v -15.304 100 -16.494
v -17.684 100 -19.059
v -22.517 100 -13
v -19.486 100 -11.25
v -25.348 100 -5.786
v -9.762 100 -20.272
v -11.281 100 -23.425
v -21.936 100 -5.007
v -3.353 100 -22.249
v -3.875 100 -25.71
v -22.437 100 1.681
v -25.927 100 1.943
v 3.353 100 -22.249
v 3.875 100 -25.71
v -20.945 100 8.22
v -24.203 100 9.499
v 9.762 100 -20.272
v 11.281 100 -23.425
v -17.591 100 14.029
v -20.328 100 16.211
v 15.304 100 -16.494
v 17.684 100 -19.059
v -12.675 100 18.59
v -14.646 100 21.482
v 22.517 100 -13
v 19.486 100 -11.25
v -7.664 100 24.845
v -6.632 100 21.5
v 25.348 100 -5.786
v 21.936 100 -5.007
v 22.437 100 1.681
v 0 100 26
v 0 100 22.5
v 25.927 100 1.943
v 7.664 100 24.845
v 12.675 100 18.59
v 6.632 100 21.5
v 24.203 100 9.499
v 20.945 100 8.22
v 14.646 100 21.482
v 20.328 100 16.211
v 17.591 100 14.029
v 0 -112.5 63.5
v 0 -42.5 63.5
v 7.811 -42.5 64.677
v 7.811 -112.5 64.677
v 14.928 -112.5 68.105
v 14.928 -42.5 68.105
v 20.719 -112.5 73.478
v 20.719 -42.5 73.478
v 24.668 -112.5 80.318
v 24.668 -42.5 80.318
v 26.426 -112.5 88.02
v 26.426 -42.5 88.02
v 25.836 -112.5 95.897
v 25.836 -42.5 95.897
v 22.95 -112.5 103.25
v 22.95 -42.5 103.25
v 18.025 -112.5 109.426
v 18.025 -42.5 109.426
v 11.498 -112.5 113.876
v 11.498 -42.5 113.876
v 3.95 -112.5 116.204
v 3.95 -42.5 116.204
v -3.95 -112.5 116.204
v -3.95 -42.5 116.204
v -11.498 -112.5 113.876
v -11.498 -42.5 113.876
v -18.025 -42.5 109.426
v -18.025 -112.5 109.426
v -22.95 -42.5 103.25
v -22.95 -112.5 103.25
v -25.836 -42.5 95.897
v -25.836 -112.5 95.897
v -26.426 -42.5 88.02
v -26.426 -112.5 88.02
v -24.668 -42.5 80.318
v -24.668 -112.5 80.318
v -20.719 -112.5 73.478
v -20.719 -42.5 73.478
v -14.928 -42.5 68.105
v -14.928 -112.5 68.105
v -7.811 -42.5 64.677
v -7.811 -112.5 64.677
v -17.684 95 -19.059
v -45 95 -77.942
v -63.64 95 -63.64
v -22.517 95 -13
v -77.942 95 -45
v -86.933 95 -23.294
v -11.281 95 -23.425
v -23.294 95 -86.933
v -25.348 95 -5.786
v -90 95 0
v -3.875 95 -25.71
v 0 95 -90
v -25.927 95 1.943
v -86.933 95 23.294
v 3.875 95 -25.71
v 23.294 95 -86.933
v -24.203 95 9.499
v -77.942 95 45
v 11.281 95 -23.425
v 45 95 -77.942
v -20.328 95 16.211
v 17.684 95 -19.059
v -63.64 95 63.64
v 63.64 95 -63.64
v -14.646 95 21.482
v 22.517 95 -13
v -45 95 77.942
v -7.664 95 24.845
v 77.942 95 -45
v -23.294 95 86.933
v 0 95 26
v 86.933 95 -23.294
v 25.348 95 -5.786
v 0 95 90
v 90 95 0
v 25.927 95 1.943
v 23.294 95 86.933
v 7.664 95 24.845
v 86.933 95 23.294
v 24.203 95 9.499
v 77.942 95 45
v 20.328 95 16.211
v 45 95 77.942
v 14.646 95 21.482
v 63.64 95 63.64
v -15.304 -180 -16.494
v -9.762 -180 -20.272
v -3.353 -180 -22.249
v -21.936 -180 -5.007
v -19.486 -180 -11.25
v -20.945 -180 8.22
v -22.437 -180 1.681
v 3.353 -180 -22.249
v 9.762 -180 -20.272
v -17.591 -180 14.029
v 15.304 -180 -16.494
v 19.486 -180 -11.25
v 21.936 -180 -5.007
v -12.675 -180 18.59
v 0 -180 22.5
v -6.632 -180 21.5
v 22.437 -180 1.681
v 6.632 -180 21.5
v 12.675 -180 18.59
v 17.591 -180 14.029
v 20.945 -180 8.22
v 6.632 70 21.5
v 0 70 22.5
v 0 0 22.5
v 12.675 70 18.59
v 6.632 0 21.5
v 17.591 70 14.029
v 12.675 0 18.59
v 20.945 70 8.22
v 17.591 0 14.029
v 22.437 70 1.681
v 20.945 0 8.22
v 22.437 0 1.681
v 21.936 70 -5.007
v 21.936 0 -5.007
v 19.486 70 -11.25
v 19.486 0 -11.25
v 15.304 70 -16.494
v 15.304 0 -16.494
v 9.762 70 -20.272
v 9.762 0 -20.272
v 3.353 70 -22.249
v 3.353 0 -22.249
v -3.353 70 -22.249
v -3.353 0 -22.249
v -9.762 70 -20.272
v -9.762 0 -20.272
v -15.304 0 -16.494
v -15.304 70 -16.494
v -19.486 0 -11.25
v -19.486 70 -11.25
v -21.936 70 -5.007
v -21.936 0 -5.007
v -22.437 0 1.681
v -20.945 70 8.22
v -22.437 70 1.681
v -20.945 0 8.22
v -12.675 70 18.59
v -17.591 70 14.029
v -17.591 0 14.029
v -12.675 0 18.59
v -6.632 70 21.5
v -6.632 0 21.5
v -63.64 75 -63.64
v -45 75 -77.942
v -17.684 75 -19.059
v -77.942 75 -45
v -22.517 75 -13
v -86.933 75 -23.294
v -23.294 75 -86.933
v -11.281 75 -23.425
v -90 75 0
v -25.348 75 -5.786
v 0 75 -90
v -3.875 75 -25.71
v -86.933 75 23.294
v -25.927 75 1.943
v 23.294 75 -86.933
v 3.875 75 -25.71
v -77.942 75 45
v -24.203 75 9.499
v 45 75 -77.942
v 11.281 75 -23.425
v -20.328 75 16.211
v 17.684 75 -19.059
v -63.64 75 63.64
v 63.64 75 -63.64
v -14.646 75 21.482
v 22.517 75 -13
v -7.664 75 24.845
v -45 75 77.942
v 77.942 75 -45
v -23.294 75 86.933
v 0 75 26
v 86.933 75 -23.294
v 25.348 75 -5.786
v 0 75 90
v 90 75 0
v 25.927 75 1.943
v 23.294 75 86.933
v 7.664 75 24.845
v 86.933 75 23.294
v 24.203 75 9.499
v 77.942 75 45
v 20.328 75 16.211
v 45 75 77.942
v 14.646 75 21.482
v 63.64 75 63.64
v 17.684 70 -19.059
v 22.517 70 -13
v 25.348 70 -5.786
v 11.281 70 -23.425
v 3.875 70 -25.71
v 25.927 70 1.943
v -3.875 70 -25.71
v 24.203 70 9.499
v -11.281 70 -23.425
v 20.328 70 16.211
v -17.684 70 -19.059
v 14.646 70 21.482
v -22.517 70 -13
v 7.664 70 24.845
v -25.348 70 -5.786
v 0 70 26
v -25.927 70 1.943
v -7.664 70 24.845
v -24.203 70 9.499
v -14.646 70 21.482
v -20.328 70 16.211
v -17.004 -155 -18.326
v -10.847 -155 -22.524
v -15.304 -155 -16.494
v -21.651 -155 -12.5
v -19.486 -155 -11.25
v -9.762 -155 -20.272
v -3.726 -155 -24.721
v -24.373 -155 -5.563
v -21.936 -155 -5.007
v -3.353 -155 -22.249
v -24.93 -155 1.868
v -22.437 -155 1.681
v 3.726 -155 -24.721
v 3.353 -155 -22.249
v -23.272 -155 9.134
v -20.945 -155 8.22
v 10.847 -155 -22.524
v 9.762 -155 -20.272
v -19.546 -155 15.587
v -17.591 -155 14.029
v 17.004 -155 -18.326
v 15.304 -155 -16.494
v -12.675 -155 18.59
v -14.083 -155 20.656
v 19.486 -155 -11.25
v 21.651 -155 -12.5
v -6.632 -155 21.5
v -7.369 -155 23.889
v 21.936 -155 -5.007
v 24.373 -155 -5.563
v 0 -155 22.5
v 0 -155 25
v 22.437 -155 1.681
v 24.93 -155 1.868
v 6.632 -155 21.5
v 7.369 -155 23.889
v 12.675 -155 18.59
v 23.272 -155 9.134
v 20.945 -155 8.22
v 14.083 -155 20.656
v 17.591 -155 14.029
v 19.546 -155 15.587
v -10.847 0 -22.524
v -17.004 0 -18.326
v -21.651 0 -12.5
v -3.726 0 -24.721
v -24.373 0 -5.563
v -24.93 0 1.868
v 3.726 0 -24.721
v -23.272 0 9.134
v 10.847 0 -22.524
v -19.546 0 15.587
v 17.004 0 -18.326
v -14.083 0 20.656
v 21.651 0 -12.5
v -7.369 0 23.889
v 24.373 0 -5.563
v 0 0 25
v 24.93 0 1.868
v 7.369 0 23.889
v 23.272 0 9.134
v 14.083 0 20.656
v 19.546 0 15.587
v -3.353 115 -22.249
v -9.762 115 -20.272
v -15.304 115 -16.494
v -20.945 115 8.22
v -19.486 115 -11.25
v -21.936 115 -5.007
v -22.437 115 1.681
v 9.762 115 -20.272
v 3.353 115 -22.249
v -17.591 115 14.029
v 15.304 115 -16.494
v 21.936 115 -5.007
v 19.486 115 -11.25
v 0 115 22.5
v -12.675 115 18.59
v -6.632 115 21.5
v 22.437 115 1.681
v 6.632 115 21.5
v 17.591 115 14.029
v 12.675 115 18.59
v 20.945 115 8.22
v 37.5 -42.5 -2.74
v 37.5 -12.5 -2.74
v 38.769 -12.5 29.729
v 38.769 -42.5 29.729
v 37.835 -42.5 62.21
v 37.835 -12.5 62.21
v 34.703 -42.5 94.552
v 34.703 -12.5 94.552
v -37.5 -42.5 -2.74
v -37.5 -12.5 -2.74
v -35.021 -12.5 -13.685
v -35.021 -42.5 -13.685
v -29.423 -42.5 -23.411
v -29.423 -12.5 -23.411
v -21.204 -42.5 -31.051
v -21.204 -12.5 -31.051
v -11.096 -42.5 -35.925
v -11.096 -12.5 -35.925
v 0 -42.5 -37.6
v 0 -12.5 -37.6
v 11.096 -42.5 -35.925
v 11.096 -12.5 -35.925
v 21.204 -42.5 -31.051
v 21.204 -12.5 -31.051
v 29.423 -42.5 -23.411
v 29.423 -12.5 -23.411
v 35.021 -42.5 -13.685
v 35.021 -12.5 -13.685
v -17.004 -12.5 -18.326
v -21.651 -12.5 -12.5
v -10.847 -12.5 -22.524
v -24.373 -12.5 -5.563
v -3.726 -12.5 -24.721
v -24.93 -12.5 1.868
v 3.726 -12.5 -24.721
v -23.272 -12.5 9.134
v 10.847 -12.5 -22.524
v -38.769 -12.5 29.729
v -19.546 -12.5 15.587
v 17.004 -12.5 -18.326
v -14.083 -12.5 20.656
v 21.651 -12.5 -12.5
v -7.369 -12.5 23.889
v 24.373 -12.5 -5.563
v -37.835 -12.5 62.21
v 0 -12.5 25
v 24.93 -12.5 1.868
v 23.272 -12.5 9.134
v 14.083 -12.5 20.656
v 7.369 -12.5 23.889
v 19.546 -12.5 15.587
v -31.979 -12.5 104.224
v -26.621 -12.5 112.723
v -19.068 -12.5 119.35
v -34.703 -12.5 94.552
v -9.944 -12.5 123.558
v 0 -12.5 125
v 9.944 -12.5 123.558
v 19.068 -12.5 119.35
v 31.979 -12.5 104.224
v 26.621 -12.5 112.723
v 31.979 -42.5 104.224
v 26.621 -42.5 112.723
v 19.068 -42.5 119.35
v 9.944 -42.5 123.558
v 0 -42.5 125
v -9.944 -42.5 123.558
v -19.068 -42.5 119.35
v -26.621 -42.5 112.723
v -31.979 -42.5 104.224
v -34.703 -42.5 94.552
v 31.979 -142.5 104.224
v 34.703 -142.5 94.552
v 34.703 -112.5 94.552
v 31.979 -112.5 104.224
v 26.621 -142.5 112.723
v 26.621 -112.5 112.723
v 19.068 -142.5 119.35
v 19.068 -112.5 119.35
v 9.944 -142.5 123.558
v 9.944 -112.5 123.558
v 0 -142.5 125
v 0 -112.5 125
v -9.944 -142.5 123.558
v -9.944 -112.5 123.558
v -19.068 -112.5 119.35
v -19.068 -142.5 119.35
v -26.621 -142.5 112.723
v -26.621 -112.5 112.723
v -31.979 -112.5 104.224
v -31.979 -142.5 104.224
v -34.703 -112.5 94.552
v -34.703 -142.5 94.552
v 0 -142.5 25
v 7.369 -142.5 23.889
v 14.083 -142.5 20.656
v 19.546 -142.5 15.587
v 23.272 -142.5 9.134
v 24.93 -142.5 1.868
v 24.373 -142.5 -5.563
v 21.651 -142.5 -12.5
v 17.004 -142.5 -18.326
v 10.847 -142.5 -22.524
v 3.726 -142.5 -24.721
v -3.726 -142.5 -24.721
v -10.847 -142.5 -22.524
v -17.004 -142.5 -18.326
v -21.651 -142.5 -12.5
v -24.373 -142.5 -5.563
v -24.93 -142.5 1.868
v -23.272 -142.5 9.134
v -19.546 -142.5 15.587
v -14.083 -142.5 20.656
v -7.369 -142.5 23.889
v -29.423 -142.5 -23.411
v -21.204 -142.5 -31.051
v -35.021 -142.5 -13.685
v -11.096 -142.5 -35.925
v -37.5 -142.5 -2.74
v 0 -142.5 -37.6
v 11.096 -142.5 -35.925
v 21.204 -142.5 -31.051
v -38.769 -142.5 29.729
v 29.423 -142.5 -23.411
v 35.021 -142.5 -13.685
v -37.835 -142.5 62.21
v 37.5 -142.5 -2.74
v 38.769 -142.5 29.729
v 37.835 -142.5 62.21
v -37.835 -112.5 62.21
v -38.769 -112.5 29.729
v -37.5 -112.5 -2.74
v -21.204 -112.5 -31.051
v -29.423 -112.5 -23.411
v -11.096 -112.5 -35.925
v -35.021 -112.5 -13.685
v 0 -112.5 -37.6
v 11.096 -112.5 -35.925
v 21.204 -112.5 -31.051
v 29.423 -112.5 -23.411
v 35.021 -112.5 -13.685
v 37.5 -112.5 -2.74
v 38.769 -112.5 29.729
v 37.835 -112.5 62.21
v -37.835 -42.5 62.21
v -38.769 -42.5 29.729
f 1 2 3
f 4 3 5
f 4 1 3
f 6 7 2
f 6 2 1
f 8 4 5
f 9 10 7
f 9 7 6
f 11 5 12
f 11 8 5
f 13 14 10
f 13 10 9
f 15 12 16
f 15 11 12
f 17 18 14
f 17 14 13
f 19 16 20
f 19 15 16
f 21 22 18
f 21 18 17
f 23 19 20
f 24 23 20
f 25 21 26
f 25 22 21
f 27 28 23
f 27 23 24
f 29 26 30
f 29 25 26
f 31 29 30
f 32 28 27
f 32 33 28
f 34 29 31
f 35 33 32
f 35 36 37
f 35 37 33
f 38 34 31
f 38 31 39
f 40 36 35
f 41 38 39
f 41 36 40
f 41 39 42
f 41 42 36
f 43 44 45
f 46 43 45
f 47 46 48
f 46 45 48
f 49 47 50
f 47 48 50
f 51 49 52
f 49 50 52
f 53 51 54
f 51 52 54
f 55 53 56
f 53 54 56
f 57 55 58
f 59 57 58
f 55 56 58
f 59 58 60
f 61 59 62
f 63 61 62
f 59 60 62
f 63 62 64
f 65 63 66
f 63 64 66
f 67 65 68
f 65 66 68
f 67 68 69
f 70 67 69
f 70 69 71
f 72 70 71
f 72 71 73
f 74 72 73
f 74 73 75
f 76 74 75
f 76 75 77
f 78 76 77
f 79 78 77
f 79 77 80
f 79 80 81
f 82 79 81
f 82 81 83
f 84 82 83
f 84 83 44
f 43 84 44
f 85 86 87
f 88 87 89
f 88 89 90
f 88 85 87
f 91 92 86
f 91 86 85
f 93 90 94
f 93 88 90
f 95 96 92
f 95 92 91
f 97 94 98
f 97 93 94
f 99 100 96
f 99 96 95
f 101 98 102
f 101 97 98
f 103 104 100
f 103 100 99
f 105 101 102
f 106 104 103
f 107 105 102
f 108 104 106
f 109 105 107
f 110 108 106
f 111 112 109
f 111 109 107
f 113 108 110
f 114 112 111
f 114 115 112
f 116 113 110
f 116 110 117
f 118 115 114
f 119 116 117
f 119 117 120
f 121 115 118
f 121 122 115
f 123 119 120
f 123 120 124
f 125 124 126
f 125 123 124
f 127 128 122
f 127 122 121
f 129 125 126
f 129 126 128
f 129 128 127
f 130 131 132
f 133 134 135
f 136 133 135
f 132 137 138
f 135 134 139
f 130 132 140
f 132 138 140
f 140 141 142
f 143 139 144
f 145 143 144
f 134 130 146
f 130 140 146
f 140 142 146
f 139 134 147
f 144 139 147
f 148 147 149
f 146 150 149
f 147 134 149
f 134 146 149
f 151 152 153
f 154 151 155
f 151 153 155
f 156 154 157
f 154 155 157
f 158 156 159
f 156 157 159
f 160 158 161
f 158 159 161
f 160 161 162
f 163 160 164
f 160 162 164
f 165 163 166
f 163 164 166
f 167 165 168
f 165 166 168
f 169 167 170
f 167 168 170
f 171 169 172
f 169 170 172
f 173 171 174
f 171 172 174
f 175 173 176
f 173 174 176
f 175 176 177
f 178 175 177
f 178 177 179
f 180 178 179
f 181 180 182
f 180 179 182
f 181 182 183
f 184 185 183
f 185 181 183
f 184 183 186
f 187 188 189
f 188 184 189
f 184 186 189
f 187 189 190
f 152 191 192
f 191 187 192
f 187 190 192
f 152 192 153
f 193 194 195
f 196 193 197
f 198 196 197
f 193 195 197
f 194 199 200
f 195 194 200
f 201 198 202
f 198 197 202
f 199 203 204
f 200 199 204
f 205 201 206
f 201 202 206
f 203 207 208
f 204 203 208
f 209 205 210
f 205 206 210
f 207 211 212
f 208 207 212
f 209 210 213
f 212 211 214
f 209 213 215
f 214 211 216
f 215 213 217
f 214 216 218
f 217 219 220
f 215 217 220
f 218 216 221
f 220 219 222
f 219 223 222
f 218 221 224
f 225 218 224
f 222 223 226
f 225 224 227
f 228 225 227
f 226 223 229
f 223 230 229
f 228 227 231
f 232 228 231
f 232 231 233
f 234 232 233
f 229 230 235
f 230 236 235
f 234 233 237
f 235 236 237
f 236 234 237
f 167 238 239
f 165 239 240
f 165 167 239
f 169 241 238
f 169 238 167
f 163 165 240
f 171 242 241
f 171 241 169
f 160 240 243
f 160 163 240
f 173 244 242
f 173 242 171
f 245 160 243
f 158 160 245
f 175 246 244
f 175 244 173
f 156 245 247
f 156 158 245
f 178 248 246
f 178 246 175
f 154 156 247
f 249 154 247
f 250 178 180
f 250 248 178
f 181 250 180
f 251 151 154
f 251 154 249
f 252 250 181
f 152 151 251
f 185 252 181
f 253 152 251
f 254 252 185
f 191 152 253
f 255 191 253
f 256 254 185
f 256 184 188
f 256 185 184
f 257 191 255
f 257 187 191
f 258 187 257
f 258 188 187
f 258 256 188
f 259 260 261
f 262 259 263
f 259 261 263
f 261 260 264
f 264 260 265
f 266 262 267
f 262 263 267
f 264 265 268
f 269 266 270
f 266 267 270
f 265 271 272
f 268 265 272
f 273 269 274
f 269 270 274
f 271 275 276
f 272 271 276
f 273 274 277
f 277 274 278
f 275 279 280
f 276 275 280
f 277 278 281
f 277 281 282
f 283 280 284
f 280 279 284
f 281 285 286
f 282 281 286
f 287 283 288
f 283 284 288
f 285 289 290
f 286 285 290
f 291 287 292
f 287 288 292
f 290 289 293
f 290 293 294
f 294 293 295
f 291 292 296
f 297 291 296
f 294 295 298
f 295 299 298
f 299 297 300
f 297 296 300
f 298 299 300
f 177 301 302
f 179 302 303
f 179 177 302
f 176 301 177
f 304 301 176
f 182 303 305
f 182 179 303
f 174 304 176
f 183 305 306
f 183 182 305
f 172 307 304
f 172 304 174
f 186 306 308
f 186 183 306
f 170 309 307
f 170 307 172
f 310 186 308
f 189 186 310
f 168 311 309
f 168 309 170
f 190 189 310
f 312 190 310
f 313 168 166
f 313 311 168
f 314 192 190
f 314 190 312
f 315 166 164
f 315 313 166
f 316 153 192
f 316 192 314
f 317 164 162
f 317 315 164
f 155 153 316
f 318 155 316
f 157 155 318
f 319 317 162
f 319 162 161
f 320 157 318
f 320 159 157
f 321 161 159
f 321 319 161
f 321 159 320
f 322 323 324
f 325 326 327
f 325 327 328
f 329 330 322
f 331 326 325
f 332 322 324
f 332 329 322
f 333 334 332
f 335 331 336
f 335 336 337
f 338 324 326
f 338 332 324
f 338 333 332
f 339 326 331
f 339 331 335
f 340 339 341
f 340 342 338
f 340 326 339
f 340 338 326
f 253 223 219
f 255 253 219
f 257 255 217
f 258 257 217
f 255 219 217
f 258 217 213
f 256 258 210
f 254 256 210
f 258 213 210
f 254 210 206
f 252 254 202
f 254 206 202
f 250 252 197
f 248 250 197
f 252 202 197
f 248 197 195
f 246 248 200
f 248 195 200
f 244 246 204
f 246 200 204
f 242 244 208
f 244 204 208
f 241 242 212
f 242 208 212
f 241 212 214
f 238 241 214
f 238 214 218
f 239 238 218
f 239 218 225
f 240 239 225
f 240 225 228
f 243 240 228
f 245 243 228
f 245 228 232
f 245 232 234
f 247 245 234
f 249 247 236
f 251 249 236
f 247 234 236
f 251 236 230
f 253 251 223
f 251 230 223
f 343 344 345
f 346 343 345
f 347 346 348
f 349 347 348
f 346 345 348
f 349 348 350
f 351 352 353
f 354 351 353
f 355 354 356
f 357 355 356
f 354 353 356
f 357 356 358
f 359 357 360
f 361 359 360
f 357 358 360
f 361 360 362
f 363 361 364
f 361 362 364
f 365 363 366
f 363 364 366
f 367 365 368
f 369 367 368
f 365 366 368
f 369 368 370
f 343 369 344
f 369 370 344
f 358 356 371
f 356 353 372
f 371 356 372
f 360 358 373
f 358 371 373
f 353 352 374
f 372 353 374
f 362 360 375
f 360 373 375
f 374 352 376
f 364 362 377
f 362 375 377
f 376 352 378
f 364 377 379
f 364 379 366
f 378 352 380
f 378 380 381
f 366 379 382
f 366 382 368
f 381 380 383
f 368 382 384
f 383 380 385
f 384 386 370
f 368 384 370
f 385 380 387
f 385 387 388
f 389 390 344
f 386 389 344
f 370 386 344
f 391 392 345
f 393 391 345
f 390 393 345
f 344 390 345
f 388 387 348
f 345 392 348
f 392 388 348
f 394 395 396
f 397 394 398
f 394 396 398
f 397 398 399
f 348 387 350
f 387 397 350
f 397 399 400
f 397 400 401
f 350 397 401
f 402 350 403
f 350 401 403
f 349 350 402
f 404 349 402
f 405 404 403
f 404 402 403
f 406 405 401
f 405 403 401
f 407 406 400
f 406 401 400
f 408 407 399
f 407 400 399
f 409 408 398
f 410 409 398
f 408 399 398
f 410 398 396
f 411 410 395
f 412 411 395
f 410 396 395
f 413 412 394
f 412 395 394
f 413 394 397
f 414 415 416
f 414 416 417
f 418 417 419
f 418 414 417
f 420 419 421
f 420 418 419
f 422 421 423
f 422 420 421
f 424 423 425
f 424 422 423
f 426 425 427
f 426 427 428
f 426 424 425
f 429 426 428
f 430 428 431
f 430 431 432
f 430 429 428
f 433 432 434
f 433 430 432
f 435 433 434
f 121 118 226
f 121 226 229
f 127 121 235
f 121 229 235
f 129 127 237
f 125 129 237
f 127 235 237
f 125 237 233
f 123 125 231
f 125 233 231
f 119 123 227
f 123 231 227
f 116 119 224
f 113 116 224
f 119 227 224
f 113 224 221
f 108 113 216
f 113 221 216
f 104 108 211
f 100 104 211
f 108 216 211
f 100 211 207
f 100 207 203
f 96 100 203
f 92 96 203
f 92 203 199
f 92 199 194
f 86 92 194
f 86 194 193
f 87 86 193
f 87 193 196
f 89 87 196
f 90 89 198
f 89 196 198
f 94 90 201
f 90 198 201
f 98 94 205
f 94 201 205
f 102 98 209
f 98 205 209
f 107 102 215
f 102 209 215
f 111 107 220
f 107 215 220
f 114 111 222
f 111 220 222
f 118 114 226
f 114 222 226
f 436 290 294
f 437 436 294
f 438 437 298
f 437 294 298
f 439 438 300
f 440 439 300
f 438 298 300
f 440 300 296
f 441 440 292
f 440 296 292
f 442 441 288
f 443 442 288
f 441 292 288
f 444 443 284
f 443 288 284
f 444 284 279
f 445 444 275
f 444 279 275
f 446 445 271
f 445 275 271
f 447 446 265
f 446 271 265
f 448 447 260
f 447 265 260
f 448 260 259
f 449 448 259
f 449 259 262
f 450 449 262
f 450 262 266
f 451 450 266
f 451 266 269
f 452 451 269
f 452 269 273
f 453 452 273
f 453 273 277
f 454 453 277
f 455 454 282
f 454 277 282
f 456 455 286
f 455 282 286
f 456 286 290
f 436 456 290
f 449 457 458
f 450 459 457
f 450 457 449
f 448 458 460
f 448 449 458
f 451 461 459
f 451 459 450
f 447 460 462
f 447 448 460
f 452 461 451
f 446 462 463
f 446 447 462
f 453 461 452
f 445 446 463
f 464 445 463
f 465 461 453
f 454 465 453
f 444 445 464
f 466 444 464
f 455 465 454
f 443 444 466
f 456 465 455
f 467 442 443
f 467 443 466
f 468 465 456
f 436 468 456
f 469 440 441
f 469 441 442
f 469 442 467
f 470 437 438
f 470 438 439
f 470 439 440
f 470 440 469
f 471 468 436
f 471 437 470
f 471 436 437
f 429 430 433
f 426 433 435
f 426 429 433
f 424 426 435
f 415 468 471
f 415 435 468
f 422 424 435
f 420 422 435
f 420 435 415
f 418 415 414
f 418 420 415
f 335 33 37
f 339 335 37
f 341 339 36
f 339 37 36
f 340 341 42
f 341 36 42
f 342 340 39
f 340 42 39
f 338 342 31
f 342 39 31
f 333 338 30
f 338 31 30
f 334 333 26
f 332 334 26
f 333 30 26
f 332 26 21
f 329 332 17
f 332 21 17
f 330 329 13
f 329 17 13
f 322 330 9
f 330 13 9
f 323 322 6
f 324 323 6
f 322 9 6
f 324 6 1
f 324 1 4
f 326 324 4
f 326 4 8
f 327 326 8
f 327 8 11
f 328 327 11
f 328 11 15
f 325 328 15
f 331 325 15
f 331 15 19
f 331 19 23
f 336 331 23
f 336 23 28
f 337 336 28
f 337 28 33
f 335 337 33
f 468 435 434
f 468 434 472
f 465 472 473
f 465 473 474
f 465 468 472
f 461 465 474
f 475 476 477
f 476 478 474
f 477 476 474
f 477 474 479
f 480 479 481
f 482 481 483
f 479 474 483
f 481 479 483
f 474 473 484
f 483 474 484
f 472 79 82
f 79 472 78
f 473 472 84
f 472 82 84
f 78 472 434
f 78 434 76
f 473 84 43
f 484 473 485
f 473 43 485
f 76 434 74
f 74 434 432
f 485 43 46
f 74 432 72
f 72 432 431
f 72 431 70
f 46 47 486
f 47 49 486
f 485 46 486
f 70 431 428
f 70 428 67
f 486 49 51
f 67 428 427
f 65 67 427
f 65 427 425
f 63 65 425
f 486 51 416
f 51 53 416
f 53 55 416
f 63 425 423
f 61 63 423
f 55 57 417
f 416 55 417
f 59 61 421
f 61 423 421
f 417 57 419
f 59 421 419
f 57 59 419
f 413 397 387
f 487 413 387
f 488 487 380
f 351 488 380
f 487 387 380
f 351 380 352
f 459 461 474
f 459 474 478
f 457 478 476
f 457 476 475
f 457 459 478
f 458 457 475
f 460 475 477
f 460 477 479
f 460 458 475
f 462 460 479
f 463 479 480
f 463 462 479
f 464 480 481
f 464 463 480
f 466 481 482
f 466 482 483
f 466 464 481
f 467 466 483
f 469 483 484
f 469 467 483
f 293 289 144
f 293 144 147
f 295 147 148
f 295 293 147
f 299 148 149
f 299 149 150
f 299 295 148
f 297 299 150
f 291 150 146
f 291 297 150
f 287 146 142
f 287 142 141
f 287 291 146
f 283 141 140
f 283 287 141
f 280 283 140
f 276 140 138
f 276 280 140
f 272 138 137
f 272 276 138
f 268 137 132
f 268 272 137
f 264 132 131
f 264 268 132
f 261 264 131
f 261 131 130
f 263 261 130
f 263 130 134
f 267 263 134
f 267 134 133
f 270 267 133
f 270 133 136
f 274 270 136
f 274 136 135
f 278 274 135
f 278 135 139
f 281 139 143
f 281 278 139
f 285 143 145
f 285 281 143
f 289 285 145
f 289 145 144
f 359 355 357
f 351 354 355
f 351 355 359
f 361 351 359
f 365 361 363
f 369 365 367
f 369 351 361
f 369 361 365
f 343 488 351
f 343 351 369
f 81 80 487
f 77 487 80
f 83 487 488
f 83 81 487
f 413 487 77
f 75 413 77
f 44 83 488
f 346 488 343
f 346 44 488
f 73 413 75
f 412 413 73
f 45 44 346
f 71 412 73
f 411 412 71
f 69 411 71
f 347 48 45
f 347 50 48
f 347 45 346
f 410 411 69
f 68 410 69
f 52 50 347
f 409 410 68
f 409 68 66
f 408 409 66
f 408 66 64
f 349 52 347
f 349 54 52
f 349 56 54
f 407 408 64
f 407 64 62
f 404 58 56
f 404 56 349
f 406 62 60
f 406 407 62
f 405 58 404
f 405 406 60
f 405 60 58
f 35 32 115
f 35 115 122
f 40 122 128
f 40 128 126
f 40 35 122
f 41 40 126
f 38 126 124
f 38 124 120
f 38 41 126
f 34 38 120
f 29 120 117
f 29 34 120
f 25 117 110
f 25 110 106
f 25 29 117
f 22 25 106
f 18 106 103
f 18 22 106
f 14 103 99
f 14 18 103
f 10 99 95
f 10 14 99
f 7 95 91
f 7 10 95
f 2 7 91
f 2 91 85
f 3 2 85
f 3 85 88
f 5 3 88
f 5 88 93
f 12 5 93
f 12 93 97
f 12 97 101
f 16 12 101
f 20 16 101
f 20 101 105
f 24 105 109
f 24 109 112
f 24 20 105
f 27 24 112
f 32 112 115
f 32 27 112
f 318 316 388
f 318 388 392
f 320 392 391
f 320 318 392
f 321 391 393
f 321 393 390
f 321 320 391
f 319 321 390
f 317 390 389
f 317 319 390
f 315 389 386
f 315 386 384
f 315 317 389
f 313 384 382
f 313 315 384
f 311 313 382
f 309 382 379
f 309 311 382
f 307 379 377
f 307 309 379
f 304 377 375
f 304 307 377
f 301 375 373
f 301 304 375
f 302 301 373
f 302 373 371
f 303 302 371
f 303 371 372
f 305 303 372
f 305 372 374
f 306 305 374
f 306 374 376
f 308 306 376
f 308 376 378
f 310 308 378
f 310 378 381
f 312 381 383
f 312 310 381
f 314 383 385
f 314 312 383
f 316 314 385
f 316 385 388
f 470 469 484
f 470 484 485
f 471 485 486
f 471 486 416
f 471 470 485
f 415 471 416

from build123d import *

# Parameters (mm, degrees)
SKETCH1_R           = 22.5
BOSS_EXTRUDE1_DEPTH = 25
SKETCH2_R           = 25
BOSS_EXTRUDE2_DEPTH = 12.5
BOSS_EXTRUDE3_DEPTH = 30
SKETCH4_R           = 26.5
BOSS_EXTRUDE4_DEPTH = 35
SKETCH5_R           = 22.5
BOSS_EXTRUDE5_DEPTH = 50
SKETCH6_R           = 90
BOSS_EXTRUDE6_DEPTH = 20
SKETCH7_R           = 22.5
BOSS_EXTRUDE7_DEPTH = 20
SKETCH8_R           = 26
BOSS_EXTRUDE8_DEPTH = 5
BOSS_EXTRUDE9_START = 5
SKETCH9_R           = 26
BOSS_EXTRUDE9_DEPTH = 5


with BuildPart() as part:
    # Sketch1 → Boss-Extrude1 (new body)
    with BuildSketch(Plane(origin=(0, 0, 0), x_dir=(1, 0, 0), z_dir=(0, 1, 0))):
        with Locations(Location((0, 0, 0), (0, 0, 270))):
            Circle(SKETCH1_R)
    extrude(amount=BOSS_EXTRUDE1_DEPTH)

    # Sketch2 → Boss-Extrude2 (add)
    with BuildSketch(Plane(origin=(0, 0, 0), x_dir=(1, 0, 0), z_dir=(0, 1, 0))):
        with Locations(Location((0, 0, 0), (0, 0, 270))):
            Circle(SKETCH2_R)
    extrude(amount=-BOSS_EXTRUDE2_DEPTH)

    # Sketch3 → Boss-Extrude3 (add)
    with BuildSketch(Plane.XZ.offset(12.5)):
        with BuildLine():
            ThreePointArc((-37.5, -2.740437921), (0, -37.6), (37.5, -2.740437921))
            ThreePointArc((37.5, -2.740437921), (38.576956863, 45.97711937), (34.702685351, 94.552321322))
            ThreePointArc((34.702685351, 94.552321322), (0, 125), (-34.702685351, 94.552321322))
            ThreePointArc((-34.702685351, 94.552321322), (-38.576956863, 45.97711937), (-37.5, -2.740437921))
        make_face()
    extrude(amount=BOSS_EXTRUDE3_DEPTH)

    # Sketch4 → Boss-Extrude4 (add)
    with BuildSketch(Plane.XZ.offset(42.5)):
        with Locations(Location((0, 90, 0), (0, 0, 270))):
            Circle(SKETCH4_R)
    extrude(amount=BOSS_EXTRUDE4_DEPTH)

    # Mirror1: part across plane


with BuildPart() as part_1:
    add(part.part)
    add(part.part.mirror(Plane(origin=(0, -77.5, 90), x_dir=(0, 0, 1), z_dir=(0, -1, 0))))

    # Sketch5 → Boss-Extrude5 (add)
    with BuildSketch(Plane(origin=(0, 25, 0), x_dir=(1, 0, 0), z_dir=(0, 1, 0))):
        with Locations(Location((0, 0, 0), (0, 0, 270))):
            Circle(SKETCH5_R)
    extrude(amount=BOSS_EXTRUDE5_DEPTH)

    # Sketch6 → Boss-Extrude6 (add)
    with BuildSketch(Plane(origin=(0, 75, 0), x_dir=(1, 0, 0), z_dir=(0, 1, 0))):
        with Locations(Location((0, 0, 0), (0, 0, 270))):
            Circle(SKETCH6_R)
    extrude(amount=BOSS_EXTRUDE6_DEPTH)

    # Sketch7 → Boss-Extrude7 (add)
    with BuildSketch(Plane(origin=(0, 95, 0), x_dir=(1, 0, 0), z_dir=(0, 1, 0))):
        with Locations(Location((0, 0, 0), (0, 0, 270))):
            Circle(SKETCH7_R)
    extrude(amount=BOSS_EXTRUDE7_DEPTH)

    # Sketch8 → Boss-Extrude8 (add)
    with BuildSketch(Plane.XZ.offset(-75)):
        with Locations(Location((0, 0, 0), (0, 0, 90))):
            Circle(SKETCH8_R)
    extrude(amount=BOSS_EXTRUDE8_DEPTH)

    # Sketch9 → Boss-Extrude9 (add)
    with BuildSketch(Plane(origin=(0, 95, 0), x_dir=(1, 0, 0), z_dir=(0, 1, 0)).offset(BOSS_EXTRUDE9_START)):
        with Locations(Location((0, 0, 0), (0, 0, 270))):
            Circle(SKETCH9_R)
    extrude(amount=-BOSS_EXTRUDE9_DEPTH)


solid = part_1.part
